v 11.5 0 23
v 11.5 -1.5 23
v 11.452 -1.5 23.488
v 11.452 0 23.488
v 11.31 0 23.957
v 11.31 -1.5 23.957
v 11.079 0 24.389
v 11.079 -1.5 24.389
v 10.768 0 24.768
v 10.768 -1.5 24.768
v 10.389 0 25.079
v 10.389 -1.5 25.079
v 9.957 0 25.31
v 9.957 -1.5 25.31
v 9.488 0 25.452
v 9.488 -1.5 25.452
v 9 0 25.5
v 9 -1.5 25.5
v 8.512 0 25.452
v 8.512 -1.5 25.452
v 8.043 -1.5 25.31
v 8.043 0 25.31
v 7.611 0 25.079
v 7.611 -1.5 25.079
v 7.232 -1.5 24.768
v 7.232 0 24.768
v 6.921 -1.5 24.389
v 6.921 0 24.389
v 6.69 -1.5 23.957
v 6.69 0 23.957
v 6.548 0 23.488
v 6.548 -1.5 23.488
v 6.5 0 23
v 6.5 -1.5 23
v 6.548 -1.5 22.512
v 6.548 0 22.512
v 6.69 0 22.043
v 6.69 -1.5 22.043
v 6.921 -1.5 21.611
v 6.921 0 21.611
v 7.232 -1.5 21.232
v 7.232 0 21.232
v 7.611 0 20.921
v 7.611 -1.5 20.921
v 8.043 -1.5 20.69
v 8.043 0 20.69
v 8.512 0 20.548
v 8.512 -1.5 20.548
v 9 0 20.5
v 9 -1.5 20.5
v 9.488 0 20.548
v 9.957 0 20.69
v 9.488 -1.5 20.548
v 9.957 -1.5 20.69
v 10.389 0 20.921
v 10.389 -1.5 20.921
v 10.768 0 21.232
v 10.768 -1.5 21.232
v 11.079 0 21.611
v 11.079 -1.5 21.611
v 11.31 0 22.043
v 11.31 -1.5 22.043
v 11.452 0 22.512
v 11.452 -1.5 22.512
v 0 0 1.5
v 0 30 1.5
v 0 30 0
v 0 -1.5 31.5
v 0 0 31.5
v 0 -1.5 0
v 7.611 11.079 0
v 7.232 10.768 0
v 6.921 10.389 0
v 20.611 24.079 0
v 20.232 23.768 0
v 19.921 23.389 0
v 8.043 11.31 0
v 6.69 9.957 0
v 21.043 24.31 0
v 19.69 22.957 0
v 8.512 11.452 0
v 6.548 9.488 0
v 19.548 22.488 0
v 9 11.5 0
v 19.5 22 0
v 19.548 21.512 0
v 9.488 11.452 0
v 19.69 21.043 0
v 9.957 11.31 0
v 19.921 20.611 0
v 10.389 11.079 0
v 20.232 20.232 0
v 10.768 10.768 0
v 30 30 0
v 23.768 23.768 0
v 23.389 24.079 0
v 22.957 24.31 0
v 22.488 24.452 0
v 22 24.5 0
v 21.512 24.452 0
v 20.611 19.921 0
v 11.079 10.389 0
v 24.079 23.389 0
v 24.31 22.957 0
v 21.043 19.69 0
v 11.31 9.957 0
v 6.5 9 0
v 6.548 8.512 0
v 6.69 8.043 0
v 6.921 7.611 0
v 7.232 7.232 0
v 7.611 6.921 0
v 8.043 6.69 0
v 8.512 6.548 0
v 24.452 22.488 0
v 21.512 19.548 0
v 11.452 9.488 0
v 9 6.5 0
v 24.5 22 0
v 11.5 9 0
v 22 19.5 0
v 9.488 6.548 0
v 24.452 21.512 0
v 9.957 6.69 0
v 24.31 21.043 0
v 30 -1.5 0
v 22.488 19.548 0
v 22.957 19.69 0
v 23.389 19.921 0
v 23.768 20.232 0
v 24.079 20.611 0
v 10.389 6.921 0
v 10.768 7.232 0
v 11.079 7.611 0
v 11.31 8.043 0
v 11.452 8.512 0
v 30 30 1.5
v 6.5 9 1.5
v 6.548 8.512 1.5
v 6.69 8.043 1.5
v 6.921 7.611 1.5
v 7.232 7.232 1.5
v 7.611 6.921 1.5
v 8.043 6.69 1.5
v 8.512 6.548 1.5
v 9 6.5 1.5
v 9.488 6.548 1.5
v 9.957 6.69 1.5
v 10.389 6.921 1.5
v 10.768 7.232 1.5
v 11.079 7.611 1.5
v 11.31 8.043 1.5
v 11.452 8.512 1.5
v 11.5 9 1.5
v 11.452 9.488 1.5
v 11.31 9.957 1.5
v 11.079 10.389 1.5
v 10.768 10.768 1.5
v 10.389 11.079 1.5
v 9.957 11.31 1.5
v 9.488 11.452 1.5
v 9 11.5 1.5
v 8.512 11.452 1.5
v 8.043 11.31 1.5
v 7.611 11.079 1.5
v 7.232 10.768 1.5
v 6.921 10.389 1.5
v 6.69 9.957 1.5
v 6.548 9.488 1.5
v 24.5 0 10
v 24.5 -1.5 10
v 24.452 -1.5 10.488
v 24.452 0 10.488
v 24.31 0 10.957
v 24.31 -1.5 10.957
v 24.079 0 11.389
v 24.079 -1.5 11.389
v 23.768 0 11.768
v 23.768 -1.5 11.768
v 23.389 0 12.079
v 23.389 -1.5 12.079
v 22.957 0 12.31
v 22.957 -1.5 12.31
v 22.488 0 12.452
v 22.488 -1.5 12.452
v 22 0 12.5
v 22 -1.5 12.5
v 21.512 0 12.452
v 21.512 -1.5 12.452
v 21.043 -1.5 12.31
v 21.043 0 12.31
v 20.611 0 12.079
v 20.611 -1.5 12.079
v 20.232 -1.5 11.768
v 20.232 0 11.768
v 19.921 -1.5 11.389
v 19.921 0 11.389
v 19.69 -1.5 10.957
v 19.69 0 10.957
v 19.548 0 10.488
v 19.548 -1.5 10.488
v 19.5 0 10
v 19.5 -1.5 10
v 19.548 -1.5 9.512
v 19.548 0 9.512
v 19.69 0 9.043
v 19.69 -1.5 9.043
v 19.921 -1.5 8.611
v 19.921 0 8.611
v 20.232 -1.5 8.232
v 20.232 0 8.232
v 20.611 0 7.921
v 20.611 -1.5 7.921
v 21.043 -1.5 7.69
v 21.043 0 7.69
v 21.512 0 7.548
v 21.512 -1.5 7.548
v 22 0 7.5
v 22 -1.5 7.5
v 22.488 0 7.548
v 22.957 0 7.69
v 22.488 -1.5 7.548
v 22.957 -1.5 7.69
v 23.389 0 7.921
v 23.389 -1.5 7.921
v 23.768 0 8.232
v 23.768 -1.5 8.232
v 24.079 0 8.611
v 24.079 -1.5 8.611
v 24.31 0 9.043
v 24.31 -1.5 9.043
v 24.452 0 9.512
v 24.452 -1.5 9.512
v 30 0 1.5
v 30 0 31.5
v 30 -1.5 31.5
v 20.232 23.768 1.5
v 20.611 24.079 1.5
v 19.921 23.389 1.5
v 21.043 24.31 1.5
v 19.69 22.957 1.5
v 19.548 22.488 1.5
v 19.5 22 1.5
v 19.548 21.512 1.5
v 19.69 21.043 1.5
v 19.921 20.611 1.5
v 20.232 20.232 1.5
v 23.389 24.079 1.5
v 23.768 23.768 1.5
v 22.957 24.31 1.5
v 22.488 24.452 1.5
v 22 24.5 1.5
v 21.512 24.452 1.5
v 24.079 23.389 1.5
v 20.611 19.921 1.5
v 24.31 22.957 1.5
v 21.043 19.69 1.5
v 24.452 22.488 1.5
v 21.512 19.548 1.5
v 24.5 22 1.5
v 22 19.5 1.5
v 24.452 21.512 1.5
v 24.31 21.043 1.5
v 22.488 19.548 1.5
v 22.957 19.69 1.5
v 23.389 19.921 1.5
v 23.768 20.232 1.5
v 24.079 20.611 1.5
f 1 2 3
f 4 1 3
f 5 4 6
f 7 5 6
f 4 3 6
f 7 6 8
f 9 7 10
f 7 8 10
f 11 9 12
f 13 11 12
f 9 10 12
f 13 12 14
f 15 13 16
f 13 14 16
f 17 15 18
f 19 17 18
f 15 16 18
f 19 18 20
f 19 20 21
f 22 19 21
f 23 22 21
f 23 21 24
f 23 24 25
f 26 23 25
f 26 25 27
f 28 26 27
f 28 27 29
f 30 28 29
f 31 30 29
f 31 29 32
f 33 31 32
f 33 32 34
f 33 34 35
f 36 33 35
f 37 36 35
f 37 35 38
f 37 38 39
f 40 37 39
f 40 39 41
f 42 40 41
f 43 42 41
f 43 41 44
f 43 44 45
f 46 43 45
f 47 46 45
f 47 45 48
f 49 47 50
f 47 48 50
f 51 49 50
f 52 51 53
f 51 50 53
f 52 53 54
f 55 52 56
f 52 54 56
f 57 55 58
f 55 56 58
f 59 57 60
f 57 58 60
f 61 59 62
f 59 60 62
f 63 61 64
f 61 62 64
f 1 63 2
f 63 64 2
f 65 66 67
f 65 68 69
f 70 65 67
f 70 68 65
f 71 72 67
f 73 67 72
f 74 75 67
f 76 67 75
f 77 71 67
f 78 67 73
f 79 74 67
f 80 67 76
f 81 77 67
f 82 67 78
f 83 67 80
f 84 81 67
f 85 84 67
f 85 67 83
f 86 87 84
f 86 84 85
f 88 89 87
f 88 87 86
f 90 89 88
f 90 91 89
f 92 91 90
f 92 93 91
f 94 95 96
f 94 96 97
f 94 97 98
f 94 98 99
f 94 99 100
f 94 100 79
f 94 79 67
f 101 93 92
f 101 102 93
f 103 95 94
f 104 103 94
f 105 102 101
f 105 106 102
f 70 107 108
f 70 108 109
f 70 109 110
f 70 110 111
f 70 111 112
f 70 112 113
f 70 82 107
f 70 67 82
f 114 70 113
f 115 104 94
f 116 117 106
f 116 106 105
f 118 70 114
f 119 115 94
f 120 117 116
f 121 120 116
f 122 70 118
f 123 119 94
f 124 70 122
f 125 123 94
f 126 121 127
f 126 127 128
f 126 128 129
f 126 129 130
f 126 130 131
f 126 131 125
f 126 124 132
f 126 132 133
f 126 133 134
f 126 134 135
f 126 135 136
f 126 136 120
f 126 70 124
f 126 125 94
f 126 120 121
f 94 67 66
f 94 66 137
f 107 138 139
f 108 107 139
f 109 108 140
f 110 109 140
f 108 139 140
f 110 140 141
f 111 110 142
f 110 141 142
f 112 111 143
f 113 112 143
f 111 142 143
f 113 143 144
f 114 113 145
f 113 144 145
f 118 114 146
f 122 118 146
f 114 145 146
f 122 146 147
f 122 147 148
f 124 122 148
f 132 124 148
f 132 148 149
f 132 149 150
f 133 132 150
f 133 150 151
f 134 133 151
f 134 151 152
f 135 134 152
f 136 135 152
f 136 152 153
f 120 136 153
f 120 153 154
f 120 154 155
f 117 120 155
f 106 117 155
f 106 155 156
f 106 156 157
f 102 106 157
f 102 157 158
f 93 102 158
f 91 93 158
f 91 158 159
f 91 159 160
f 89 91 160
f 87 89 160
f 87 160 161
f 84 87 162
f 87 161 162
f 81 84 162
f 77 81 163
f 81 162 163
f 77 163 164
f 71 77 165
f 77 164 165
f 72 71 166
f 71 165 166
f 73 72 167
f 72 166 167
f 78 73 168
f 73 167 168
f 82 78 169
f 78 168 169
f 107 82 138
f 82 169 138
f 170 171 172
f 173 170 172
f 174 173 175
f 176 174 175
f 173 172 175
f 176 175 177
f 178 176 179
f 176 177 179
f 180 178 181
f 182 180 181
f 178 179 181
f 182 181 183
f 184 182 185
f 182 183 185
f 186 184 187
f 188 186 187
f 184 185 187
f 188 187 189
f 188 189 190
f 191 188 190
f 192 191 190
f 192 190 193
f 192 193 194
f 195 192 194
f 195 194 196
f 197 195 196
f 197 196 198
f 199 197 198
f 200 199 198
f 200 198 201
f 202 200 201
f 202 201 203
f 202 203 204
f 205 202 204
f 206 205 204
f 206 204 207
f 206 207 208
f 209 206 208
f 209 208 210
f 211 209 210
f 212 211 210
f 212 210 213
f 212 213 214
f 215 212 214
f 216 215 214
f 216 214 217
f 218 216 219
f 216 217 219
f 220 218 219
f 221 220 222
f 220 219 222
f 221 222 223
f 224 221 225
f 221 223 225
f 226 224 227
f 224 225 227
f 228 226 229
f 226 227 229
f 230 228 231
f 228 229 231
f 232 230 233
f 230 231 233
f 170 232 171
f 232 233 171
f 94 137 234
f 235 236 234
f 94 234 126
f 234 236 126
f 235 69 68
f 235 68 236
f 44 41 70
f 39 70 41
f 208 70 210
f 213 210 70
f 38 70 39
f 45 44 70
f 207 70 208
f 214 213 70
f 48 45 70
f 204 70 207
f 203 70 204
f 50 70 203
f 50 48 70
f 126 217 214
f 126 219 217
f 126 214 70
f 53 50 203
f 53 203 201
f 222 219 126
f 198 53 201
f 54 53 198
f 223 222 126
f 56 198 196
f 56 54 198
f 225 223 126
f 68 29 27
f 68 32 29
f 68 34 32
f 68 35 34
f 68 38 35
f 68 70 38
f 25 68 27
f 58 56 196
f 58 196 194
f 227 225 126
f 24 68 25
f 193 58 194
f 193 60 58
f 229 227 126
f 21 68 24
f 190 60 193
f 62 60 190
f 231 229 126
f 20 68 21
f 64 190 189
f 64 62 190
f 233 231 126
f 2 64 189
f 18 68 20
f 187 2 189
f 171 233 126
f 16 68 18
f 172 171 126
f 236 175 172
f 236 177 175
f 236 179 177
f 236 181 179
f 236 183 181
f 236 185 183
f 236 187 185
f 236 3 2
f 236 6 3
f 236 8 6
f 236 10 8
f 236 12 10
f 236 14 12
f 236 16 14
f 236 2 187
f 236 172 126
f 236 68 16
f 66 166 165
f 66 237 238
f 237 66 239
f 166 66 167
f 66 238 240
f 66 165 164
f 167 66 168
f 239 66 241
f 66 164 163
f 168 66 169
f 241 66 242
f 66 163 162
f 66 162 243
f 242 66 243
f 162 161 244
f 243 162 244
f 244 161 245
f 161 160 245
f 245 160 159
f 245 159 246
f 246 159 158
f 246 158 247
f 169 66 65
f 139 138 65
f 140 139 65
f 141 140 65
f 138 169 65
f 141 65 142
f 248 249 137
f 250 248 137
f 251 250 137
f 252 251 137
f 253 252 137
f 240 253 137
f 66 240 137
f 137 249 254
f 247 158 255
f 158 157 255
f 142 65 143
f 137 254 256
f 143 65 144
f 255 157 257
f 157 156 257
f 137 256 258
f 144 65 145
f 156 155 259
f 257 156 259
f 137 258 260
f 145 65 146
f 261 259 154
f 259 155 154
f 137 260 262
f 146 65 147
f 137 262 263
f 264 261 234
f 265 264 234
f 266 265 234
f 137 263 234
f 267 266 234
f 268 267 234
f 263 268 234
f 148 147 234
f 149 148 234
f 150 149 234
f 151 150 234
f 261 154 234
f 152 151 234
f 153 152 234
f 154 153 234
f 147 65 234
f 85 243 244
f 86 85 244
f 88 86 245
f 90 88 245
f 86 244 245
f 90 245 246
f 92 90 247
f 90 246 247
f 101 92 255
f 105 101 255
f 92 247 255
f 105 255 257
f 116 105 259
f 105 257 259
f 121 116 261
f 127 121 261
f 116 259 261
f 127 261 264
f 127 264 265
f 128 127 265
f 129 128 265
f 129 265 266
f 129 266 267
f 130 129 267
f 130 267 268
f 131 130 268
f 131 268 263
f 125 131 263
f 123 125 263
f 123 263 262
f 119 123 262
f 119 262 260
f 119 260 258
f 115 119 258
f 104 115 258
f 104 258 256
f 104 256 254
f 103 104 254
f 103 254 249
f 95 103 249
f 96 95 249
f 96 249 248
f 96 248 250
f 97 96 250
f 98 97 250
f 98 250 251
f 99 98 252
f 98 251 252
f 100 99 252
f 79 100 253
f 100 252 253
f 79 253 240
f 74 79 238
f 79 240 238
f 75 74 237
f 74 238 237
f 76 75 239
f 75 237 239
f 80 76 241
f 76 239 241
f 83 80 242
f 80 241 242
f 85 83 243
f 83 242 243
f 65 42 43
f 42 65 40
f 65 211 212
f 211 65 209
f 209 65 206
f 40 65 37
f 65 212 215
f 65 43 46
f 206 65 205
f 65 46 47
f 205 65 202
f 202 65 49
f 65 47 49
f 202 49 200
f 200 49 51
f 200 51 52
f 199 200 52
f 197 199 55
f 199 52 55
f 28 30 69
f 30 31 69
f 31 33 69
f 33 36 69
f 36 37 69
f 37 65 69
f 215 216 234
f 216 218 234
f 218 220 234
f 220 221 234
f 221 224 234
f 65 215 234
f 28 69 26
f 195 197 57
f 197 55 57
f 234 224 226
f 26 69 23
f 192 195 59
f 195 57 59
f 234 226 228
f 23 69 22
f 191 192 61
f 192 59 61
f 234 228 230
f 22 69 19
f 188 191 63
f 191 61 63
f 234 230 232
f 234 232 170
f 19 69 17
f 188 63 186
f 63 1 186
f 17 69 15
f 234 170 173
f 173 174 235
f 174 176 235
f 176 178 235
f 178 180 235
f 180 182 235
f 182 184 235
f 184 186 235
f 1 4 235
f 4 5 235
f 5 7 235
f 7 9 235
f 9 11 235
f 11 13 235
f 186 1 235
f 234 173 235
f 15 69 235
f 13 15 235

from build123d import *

# Parameters (mm, degrees)
SKETCH_W        = 30
SKETCH_H        = 31.5
PAD_DEPTH       = 1.5
SKETCH001_R     = 2.5
POCKET_DEPTH    = 1.501
SKETCH002_W     = 30
SKETCH002_H     = 1.5
PAD001_DEPTH    = 30
SKETCH003_R     = 2.5
POCKET001_DEPTH = 1.501


with BuildPart() as part:
    # Sketch → Pad (new body)
    with BuildSketch(Plane.XZ):
        with Locations((15, 15.75)):
            Rectangle(SKETCH_W, SKETCH_H)
    extrude(amount=PAD_DEPTH)

    # Sketch001 (on Face6 of Pad) → Pocket (cut, through all)
    with BuildSketch(Plane.XZ.offset(1.5)):
        with Locations((22, 10)):
            Circle(SKETCH001_R)
        with Locations((9, 23)):
            Circle(SKETCH001_R)
    extrude(amount=-POCKET_DEPTH, mode=Mode.SUBTRACT)

    # Sketch002 (on Face4 of Pocket) → Pad001 (join)
    with BuildSketch(Plane(origin=(0, 0, 0), x_dir=(1, 0, 0), z_dir=(0, 1, 0))):
        with Locations((15, -0.75)):
            Rectangle(SKETCH002_W, SKETCH002_H)
    extrude(amount=PAD001_DEPTH)

    # Sketch003 (on Face13 of Pad001) → Pocket001 (cut, through all)
    with BuildSketch(Plane(origin=(0, 0, 1.5), x_dir=(-1, 0, 0), z_dir=(0, 0, 1))):
        with Locations((-9, -9)):
            Circle(SKETCH003_R)
        with Locations((-22, -22)):
            Circle(SKETCH003_R)
    extrude(amount=-POCKET001_DEPTH, mode=Mode.SUBTRACT)


solid = part.part
